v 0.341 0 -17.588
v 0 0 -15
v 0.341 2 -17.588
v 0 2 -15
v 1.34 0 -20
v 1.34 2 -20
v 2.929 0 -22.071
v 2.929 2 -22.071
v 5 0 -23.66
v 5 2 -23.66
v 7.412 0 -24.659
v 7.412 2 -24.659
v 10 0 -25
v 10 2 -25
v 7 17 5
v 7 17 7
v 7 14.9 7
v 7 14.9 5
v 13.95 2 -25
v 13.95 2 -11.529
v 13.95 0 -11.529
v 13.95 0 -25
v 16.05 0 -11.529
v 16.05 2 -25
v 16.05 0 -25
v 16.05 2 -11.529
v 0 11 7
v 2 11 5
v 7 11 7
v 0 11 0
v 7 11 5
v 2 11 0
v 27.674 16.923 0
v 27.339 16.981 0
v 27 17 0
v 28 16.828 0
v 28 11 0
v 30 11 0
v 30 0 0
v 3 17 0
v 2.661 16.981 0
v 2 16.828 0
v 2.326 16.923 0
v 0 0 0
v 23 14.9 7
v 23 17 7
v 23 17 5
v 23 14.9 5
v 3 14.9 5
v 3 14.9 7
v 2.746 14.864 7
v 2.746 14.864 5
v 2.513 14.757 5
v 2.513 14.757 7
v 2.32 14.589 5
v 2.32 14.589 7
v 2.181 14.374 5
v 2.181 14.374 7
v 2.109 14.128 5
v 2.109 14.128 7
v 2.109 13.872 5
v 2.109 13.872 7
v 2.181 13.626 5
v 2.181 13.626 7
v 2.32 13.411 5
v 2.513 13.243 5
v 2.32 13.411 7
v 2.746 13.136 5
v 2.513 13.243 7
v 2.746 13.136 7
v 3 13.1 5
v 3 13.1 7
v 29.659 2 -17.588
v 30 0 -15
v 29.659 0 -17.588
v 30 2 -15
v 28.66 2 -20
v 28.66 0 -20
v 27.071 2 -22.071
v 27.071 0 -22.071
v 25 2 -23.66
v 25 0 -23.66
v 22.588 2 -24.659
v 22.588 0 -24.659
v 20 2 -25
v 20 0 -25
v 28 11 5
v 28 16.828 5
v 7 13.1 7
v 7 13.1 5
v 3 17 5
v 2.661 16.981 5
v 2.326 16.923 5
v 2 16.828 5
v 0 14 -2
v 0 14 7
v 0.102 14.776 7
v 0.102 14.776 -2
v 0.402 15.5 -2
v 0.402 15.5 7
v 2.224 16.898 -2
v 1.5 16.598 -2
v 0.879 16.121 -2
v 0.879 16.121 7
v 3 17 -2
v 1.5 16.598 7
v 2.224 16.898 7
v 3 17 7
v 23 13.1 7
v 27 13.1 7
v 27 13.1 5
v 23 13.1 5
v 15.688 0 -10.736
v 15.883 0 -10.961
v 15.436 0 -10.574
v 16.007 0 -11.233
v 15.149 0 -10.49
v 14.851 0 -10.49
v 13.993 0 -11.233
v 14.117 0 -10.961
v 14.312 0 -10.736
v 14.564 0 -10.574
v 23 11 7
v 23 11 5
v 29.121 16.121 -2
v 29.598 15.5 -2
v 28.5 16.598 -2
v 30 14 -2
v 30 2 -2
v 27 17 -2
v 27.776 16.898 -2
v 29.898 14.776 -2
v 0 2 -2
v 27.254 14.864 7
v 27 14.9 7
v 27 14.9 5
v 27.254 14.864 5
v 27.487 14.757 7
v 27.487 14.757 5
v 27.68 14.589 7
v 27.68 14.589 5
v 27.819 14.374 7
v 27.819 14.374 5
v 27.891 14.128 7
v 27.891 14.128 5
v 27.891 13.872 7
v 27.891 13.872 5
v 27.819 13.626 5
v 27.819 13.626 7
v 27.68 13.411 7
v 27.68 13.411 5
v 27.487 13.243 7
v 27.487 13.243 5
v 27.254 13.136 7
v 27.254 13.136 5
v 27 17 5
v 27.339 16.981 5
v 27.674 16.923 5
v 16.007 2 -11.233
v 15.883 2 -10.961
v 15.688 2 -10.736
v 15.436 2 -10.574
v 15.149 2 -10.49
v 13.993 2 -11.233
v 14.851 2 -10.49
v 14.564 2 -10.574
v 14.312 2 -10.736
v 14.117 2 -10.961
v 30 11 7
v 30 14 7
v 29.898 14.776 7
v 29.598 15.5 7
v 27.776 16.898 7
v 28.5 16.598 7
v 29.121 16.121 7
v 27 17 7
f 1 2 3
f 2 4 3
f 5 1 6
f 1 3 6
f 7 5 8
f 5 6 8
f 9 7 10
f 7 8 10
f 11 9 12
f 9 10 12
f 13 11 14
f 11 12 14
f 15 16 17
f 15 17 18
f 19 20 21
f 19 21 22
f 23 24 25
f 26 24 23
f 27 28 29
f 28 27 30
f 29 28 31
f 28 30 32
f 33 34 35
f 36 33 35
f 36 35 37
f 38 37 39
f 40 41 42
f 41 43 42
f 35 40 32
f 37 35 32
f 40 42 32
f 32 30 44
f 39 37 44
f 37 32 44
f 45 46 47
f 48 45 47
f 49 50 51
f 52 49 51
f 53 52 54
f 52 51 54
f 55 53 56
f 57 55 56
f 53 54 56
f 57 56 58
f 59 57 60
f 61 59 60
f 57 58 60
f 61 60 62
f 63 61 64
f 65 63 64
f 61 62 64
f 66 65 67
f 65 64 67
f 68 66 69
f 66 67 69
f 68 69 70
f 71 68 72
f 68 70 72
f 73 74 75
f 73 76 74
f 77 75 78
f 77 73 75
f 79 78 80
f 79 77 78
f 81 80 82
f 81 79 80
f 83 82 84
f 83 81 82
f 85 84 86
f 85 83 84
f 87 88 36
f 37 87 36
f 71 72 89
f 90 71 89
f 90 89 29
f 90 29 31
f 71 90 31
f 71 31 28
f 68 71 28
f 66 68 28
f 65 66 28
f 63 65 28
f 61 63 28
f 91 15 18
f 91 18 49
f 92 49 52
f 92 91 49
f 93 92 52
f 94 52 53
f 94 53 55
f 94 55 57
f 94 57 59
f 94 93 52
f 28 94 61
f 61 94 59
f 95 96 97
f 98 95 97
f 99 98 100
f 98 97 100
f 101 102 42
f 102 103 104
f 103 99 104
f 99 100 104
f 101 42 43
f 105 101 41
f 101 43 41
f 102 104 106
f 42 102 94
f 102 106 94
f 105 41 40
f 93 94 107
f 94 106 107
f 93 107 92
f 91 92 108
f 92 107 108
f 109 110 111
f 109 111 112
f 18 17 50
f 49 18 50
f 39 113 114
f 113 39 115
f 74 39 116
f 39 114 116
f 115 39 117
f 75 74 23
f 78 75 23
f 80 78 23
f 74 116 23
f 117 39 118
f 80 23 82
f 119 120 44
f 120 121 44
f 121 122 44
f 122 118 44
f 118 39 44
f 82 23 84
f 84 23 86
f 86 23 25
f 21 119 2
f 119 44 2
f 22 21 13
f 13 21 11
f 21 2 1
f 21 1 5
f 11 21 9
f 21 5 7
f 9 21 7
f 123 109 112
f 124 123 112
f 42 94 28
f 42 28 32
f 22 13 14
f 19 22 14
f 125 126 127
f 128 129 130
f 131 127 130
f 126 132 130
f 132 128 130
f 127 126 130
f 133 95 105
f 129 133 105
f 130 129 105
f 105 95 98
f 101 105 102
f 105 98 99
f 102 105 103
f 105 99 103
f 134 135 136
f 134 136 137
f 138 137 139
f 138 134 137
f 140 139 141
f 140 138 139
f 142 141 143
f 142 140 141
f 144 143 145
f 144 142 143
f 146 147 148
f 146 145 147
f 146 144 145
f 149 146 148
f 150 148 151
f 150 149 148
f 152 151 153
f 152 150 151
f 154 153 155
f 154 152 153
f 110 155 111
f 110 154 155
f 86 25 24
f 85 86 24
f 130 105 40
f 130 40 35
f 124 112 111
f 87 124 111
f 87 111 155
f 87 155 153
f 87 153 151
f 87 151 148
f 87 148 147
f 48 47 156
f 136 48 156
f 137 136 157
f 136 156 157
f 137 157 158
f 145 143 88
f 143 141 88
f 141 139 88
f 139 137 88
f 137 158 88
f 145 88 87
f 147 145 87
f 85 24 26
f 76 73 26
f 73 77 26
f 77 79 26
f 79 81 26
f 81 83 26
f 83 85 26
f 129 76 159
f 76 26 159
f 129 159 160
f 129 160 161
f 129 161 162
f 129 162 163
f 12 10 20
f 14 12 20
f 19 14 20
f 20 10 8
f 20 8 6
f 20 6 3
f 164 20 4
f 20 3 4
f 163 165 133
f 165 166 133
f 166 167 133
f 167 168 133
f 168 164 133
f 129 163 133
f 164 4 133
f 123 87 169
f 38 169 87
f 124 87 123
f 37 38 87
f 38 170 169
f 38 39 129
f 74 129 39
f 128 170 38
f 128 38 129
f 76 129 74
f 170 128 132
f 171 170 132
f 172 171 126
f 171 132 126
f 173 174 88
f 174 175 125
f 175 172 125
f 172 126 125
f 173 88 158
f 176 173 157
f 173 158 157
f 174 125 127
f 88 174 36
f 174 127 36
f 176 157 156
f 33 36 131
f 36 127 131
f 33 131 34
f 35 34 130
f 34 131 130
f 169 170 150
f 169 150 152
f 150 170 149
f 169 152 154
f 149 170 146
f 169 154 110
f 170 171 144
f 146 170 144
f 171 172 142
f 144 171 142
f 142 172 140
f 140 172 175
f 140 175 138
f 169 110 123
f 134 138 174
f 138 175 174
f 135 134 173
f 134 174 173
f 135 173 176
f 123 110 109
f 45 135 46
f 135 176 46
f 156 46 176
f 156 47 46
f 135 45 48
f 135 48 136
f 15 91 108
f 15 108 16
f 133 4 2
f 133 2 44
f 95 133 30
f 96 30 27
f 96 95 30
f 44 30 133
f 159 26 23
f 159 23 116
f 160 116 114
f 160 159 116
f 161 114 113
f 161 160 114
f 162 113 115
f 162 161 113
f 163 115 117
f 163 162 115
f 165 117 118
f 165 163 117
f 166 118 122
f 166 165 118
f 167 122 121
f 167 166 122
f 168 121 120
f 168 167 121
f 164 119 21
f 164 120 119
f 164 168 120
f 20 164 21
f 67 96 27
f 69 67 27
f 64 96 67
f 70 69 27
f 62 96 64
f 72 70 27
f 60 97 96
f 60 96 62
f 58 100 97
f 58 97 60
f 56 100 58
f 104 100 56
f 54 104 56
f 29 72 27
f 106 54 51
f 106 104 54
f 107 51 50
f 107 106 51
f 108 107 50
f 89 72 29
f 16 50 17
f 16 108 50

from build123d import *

# Parameters (mm, degrees)
EXTRUDE_1_DEPTH     = 30
EXTRUDE_2_DEPTH     = 6
CUT_EXTRUDE_1_DEPTH = 6
CUT_EXTRUDE_2_DEPTH = 6
FILLET_1_R          = 10
FILLET_2_R          = 3


with BuildPart() as part:
    # 草图1 → 凸台-拉伸1 (new body)
    with BuildSketch(Plane(origin=(0, 0, 0), x_dir=(0, 0, -1), z_dir=(1, 0, 0))):
        Polygon((0, 0), (25, 0), (25, 2), (2, 2), (2, 17), (0, 17), align=None)
    extrude(amount=EXTRUDE_1_DEPTH)

    # 草图3 → 凸台-拉伸2 (add)
    with BuildSketch(Plane(origin=(0, 17, 0), x_dir=(1, 0, 0), z_dir=(0, 1, 0))):
        Polygon((0, 0), (0, -7), (7, -7), (7, -5), (2, -5), (2, 0), align=None)
        Polygon((28, -5), (28, 0), (30, 0), (30, -7), (23, -7), (23, -5), align=None)
    extrude(amount=-EXTRUDE_2_DEPTH)

    # 草图4 → 切除-拉伸1 (cut)
    with BuildSketch(Plane.XY.offset(7)):
        with BuildLine():
            Line((22.34696537, 14.9), (27, 14.9))
            ThreePointArc((27, 14.9), (27.9, 14), (27, 13.1))
            Line((27, 13.1), (22.34696537, 13.1))
            ThreePointArc((22.34696537, 13.1), (21.44696537, 14), (22.34696537, 14.9))
        make_face()
        with BuildLine():
            Line((7.65303463, 14.9), (3, 14.9))
            ThreePointArc((3, 14.9), (2.1, 14), (3, 13.1))
            Line((3, 13.1), (7.65303463, 13.1))
            ThreePointArc((7.65303463, 13.1), (8.55303463, 14), (7.65303463, 14.9))
        make_face()
    extrude(amount=-CUT_EXTRUDE_1_DEPTH, mode=Mode.SUBTRACT)

    # 草图5 → 切除-拉伸2 (cut)
    with BuildSketch(Plane(origin=(0, 2, 0), x_dir=(1, 0, 0), z_dir=(0, 1, 0))):
        with BuildLine():
            Line((16.05, 25.529105391), (16.05, 11.529105391))
            ThreePointArc((16.05, 11.529105391), (15, 10.479105391), (13.95, 11.529105391))
            Line((13.95, 11.529105391), (13.95, 25.529105391))
            ThreePointArc((13.95, 25.529105391), (15, 26.579105391), (16.05, 25.529105391))
        make_face()
    extrude(amount=-CUT_EXTRUDE_2_DEPTH, mode=Mode.SUBTRACT)

    # 圆角1
    fillet_1_edges = [part.edges().sort_by_distance(p)[0] for p in [
        (30, 1, -25),
        (0, 1, -25),
    ]]
    fillet(fillet_1_edges, radius=FILLET_1_R)

    # 圆角2
    # the kernel refuses this fillet: 3 mm, written as the material it takes off along each edge
    with BuildSketch(Plane(origin=(30, 17, -9.5), x_dir=(0, -1, 0), z_dir=(0, 0, 1)), Plane(origin=(0, 17, 14.5), x_dir=(0, -1, 0), z_dir=(0, 0, -1))) as fillet_2_piece_1:
        with BuildLine():
            CenterArc((FILLET_2_R, -FILLET_2_R), FILLET_2_R, 90, 90)
            Line((0, -FILLET_2_R), (0, 0))
            Line((0, 0), (FILLET_2_R, 0))
        make_face()
    extrude(amount=24, mode=Mode.SUBTRACT)


solid = part.part
